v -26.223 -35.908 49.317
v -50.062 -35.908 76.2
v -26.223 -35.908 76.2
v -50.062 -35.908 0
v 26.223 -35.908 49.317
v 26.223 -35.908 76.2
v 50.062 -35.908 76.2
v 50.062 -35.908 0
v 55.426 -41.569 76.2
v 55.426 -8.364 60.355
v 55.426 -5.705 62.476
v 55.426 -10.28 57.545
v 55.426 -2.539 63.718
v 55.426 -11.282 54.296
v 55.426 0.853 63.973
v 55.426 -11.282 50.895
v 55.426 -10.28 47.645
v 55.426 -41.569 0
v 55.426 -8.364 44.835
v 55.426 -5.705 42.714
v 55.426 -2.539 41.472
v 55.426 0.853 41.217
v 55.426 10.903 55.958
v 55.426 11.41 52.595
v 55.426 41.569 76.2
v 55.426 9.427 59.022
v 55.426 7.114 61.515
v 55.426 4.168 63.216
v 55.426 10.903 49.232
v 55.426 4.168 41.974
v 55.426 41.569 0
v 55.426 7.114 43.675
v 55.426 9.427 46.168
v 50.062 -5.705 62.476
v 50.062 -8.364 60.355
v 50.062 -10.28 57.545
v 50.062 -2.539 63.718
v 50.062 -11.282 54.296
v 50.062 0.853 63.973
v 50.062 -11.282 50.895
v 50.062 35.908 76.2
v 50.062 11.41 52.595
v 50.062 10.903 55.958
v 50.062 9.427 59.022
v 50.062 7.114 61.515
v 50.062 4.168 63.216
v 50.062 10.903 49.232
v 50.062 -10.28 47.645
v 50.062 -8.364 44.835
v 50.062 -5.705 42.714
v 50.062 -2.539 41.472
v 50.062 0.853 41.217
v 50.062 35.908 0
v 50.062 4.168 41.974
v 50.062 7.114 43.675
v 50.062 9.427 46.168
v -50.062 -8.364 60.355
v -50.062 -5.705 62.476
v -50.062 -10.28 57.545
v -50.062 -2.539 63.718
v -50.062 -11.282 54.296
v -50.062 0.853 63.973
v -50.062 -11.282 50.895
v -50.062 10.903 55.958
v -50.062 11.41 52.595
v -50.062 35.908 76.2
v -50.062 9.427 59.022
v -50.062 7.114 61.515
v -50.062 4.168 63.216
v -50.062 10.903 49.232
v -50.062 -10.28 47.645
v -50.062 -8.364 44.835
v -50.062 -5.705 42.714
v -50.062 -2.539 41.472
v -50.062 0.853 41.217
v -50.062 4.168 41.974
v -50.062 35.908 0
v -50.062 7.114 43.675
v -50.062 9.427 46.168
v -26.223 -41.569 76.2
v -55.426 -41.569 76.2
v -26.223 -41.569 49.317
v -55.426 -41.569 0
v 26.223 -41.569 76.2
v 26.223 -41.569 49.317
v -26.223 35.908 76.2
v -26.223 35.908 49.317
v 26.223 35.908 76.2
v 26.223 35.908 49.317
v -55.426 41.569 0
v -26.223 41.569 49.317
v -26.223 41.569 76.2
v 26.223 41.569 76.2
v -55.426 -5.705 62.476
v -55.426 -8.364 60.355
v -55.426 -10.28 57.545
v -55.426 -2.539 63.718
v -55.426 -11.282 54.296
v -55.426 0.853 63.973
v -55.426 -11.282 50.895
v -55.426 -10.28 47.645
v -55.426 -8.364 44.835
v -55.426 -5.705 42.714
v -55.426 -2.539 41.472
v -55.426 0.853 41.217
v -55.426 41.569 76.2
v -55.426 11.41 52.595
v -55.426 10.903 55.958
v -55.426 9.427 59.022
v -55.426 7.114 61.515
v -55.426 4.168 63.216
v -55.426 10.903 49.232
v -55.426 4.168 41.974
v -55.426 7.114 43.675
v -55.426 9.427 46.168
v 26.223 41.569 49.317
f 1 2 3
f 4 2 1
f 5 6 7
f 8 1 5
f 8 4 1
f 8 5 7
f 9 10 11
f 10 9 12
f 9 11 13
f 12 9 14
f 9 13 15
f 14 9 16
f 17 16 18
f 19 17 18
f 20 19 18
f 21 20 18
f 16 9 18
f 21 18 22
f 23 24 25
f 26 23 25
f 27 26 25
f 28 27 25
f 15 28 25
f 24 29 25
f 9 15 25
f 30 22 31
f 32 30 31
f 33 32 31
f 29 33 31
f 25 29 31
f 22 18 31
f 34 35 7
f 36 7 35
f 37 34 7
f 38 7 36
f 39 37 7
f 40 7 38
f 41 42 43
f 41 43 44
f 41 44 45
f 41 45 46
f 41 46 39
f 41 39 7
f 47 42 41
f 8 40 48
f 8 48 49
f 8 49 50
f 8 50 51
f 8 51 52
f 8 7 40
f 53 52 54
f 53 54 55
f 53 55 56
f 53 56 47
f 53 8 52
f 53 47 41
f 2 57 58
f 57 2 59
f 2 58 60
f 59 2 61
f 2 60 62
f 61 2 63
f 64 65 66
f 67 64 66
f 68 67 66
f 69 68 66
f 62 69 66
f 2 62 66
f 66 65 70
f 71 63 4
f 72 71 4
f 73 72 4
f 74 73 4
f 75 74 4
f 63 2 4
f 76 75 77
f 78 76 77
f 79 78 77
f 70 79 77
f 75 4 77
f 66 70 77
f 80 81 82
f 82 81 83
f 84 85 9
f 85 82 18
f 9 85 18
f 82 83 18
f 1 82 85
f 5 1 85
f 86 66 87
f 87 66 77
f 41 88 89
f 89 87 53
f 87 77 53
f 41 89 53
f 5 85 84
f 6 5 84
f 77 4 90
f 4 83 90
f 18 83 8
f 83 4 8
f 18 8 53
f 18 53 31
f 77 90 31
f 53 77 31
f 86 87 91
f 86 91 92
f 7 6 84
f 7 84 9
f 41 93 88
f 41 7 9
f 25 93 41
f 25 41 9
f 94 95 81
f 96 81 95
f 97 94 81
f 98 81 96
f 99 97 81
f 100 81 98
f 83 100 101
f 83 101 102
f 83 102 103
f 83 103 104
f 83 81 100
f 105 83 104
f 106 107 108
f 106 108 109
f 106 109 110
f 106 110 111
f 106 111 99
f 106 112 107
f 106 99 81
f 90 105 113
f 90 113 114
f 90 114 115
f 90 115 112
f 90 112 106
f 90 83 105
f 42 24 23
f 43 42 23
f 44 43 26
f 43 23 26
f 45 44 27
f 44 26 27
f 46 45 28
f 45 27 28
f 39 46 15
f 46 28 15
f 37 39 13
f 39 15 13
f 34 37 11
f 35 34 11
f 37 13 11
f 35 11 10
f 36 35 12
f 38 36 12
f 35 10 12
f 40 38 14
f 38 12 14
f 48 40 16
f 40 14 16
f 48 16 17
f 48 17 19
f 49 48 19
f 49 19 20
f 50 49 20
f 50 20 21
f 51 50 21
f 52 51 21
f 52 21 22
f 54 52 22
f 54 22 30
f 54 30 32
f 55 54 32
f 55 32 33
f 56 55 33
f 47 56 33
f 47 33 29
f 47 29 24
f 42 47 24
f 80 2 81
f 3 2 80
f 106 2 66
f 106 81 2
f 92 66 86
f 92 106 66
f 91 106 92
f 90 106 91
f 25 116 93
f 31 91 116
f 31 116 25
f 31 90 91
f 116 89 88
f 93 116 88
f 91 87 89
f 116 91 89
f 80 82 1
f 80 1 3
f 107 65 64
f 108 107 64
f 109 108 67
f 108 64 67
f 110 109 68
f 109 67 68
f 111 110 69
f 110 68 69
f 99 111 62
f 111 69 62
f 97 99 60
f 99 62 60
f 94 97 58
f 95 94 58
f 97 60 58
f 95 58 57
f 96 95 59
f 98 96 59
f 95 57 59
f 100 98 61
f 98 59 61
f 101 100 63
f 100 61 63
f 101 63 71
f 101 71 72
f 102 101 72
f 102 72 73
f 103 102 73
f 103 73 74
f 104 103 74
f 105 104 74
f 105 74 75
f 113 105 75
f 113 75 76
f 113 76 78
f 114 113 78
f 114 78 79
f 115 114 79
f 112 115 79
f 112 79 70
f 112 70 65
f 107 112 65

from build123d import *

# Parameters (mm, degrees)
F0_W     = 110.851846
F0_H     = 83.138884
F0_W_2   = 100.124248
F0_H_2   = 71.815304
F1_DEPTH = 76.2
F2_W     = 52.446034
F2_H     = 26.882852
F3_DEPTH = 103.124
F4_R     = 11.409512
F5_DEPTH = 113.538


with BuildPart() as f1:
    # F0 (on Top) → F1 (new body)
    with BuildSketch(Plane.XY):
        Rectangle(F0_W, F0_H)
        Rectangle(F0_W_2, F0_H_2, mode=Mode.SUBTRACT)
    extrude(amount=F1_DEPTH)

    # F2 (on face) → F3 (cut)
    with BuildSketch(Plane.XZ.offset(41.569442)):
        with Locations((0, 62.758574)):
            Rectangle(F2_W, F2_H)
    extrude(amount=-F3_DEPTH, mode=Mode.SUBTRACT)

    # F4 (on face) → F5 (cut)
    with BuildSketch(Plane.YZ.offset(55.425923)):
        with Locations((0, 52.595027)):
            Circle(F4_R)
    extrude(amount=-F5_DEPTH, mode=Mode.SUBTRACT)


solid = f1.part
